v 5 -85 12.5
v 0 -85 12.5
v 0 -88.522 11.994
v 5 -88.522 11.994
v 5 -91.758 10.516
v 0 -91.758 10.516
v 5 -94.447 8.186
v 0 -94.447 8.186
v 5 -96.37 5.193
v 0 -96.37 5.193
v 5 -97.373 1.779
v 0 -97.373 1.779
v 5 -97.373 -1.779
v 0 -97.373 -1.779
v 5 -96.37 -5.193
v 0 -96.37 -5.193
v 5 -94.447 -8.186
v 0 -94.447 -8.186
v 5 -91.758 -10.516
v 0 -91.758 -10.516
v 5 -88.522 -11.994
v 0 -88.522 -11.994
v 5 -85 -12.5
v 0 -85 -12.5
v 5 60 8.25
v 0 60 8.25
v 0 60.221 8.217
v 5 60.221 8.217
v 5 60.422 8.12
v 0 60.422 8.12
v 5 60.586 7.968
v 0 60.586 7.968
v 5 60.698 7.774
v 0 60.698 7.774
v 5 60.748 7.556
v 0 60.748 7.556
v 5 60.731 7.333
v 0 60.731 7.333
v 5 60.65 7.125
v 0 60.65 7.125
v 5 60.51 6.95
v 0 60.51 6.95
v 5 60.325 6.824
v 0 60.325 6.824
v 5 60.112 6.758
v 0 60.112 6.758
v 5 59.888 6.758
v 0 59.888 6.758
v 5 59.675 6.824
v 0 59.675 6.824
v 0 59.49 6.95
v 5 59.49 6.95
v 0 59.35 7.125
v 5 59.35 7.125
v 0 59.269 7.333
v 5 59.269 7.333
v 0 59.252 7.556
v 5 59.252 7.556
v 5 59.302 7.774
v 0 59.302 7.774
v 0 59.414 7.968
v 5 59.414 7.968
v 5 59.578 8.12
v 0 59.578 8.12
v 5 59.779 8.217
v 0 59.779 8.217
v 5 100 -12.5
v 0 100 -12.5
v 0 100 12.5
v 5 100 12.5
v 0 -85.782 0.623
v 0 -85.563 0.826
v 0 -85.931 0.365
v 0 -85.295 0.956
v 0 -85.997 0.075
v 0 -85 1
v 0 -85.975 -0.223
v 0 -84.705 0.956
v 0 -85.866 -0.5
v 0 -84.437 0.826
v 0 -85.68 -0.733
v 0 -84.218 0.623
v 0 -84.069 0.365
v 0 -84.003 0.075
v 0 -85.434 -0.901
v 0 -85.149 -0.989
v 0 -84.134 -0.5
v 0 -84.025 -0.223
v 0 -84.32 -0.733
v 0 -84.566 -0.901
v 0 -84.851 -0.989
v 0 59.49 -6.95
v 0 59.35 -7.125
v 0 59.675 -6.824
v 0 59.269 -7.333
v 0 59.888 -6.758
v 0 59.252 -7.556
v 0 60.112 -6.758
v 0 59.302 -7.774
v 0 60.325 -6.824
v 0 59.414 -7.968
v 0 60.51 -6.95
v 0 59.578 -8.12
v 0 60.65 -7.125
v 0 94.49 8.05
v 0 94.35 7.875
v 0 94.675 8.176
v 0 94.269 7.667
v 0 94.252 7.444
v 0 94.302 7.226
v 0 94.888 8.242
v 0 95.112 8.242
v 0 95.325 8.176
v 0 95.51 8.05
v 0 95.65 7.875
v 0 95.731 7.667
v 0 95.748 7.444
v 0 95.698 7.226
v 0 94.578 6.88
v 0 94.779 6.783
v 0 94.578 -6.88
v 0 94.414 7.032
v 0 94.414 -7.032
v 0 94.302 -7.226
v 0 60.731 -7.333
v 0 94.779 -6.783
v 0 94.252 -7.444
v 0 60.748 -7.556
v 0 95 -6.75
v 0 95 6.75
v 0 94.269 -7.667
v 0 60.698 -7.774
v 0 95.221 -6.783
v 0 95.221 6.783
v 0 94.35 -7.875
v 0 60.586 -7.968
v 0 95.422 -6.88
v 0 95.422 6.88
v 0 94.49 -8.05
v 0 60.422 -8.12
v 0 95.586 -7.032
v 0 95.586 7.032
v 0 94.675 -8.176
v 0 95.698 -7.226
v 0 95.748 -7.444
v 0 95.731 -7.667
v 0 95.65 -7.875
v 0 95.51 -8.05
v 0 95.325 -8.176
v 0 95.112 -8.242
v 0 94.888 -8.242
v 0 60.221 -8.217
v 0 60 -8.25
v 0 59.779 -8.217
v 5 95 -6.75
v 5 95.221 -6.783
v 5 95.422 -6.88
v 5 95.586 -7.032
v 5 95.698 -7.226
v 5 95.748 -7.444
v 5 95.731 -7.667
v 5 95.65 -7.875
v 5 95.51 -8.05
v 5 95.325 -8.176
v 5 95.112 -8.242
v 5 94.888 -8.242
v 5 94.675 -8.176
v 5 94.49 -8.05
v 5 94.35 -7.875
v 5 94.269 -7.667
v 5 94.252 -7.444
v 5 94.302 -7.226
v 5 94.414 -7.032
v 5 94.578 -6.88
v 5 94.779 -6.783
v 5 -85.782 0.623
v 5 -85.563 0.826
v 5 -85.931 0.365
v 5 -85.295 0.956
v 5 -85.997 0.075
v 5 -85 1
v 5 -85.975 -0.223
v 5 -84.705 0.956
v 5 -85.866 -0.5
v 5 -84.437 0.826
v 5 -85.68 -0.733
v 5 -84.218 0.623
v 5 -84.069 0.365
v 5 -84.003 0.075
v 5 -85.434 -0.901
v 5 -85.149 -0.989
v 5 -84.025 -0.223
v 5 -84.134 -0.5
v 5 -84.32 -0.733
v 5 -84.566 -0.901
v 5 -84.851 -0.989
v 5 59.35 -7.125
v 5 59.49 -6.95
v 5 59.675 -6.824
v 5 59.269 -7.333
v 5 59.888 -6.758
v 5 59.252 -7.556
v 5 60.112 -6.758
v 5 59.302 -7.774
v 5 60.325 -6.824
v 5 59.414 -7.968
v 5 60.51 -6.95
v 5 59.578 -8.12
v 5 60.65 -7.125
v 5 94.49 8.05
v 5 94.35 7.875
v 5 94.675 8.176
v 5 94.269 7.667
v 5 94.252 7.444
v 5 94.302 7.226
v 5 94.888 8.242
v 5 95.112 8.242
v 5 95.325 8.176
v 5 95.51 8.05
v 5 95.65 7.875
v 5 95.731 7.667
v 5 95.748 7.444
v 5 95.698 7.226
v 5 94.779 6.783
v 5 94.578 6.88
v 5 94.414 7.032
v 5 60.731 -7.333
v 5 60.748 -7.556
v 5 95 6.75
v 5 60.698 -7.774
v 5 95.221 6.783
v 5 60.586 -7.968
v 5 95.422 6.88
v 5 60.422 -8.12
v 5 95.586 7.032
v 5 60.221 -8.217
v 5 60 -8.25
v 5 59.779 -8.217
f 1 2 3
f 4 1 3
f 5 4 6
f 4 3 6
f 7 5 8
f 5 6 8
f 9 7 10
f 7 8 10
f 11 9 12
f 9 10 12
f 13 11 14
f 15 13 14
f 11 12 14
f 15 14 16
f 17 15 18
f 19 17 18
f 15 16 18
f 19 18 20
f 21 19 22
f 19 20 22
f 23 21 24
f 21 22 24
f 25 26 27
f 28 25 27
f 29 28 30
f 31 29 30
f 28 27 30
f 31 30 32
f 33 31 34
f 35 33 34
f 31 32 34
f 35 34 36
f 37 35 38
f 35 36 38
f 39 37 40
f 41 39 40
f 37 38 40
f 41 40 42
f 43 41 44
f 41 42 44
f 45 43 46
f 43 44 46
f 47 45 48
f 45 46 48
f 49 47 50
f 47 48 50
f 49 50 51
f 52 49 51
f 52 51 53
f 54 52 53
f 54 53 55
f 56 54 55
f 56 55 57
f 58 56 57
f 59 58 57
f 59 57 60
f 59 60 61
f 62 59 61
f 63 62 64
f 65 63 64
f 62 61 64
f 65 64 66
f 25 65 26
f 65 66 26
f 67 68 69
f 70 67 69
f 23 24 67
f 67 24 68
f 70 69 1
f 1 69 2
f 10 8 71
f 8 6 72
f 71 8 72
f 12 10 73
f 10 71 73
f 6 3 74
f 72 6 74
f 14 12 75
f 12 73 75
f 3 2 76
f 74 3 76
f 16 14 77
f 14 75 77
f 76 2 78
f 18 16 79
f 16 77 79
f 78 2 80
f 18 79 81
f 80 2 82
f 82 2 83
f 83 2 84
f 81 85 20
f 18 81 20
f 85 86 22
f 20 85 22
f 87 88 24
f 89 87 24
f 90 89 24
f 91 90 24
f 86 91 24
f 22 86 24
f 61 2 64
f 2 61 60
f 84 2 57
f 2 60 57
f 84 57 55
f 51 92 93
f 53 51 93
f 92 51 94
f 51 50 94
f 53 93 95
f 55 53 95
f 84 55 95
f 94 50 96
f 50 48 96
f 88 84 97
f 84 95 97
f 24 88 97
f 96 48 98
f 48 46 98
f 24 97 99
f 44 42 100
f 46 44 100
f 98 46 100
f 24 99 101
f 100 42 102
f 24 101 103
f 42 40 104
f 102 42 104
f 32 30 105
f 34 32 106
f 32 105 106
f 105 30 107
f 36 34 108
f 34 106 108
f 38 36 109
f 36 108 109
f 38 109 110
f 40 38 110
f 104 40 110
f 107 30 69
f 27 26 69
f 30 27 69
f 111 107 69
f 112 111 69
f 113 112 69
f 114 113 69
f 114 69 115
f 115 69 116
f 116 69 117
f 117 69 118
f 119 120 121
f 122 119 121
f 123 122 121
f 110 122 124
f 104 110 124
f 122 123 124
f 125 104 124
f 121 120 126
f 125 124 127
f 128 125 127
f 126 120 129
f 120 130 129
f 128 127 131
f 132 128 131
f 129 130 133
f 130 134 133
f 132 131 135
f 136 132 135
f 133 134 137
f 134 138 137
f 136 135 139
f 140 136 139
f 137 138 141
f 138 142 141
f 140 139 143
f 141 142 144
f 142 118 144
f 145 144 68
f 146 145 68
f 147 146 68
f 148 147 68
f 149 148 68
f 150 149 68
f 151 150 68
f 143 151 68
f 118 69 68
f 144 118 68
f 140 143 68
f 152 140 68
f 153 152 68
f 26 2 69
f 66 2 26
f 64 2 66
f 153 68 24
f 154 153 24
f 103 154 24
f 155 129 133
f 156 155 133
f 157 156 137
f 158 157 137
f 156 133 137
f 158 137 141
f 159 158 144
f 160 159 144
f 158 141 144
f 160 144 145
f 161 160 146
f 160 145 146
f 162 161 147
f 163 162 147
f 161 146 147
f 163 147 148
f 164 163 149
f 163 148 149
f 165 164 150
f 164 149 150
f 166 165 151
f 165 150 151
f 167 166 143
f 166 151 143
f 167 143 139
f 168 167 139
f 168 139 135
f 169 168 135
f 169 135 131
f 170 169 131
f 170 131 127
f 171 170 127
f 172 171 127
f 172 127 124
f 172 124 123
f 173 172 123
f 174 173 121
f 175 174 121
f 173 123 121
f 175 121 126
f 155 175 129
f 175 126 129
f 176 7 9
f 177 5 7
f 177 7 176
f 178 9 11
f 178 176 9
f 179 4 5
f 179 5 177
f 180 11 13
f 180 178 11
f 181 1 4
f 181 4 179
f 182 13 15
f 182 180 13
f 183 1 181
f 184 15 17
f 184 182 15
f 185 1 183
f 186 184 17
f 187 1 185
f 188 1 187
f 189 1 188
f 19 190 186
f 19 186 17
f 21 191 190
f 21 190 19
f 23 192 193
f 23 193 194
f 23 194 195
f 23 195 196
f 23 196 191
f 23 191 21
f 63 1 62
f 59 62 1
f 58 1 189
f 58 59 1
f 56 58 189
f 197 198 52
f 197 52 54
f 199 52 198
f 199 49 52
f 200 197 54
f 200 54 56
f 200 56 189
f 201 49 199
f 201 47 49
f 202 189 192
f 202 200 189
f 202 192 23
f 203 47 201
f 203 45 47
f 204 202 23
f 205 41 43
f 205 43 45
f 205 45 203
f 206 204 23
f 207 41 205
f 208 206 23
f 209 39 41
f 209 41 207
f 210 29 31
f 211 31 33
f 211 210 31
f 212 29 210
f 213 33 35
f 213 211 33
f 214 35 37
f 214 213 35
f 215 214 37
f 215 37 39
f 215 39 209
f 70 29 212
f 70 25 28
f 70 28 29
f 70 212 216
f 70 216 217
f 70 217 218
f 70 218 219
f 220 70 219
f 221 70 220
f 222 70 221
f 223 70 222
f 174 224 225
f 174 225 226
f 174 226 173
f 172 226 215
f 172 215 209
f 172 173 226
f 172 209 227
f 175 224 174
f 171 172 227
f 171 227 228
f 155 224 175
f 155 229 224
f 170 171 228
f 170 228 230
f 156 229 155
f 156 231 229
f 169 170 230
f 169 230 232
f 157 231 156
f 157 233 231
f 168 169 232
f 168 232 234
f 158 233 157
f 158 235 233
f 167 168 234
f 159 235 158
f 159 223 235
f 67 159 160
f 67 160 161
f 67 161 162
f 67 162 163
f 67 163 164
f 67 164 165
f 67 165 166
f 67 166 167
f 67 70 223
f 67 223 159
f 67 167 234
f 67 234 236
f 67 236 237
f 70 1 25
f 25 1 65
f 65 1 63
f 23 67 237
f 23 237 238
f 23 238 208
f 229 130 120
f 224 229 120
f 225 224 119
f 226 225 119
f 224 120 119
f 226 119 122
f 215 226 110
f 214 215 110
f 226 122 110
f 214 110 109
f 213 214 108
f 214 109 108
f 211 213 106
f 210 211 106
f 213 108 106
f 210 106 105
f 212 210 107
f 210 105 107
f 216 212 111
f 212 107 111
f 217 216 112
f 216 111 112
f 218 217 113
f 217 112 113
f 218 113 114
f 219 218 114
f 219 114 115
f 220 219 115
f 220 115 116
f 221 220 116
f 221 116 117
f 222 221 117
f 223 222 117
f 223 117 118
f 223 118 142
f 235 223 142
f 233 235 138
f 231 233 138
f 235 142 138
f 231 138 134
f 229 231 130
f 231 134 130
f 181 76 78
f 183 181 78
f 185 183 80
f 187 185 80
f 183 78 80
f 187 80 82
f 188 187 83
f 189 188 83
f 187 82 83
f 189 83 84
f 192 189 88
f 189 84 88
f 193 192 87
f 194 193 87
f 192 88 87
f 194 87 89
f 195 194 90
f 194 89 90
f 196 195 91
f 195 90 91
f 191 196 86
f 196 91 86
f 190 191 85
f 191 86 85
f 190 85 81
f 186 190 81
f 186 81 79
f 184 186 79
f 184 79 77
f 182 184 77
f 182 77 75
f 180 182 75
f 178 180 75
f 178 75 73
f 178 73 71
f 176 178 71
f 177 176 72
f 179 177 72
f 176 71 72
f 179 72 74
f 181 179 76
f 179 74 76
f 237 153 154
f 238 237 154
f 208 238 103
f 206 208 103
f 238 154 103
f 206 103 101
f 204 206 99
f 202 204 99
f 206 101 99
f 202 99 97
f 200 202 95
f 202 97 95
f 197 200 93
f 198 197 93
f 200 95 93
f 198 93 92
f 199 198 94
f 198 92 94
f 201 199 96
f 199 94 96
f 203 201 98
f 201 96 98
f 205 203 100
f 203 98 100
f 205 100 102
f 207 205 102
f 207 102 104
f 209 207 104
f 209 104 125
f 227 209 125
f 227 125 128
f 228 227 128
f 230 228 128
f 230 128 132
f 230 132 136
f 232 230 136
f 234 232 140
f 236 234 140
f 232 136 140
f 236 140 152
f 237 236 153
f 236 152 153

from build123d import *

# Parameters (mm, degrees)
BOSS_EXTRUDE2_DEPTH = 5
SKETCH4_R           = 0.75
CUT_EXTRUDE1_DEPTH  = 5
SKETCH5_R           = 1
CUT_EXTRUDE2_DEPTH  = 5


with BuildPart() as part:
    # Sketch3 → Boss-Extrude2 (new body)
    with BuildSketch(Plane(origin=(0, 0, 0), x_dir=(0, 0, -1), z_dir=(1, 0, 0))):
        with BuildLine():
            Line((12.5, 100), (-12.5, 100))
            Line((-12.5, 100), (-12.5, -85))
            ThreePointArc((-12.5, -85), (0, -97.5), (12.5, -85))
            Line((12.5, -85), (12.5, 100))
        make_face()
    extrude(amount=BOSS_EXTRUDE2_DEPTH)

    # Sketch4 → Cut-Extrude1 (cut)
    with BuildSketch(Plane.ZY):
        with Locations((-7.5, 95)):
            Circle(SKETCH4_R)
        with Locations(Location((-7.5, 60, 0), (0, 0, 180))):
            Circle(SKETCH4_R)
        with Locations((7.5, 60)):
            Circle(SKETCH4_R)
        with Locations(Location((7.5, 95, 0), (0, 0, 180))):
            Circle(SKETCH4_R)
    extrude(amount=-CUT_EXTRUDE1_DEPTH, mode=Mode.SUBTRACT)

    # Sketch5 → Cut-Extrude2 (cut)
    with BuildSketch(Plane.ZY):
        with Locations((0, -85)):
            Circle(SKETCH5_R)
    extrude(amount=-CUT_EXTRUDE2_DEPTH, mode=Mode.SUBTRACT)


solid = part.part
